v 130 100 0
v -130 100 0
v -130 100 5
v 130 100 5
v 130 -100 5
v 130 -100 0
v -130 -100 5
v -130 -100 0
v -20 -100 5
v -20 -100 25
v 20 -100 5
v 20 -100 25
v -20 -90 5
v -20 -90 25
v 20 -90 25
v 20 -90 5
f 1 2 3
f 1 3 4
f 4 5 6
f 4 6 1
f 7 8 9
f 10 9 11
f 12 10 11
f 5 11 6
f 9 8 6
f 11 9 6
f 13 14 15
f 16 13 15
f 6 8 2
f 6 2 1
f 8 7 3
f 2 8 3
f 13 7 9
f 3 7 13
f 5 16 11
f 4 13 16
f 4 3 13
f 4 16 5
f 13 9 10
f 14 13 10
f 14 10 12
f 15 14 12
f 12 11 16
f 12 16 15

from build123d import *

# Parameters (mm, degrees)
SKETCH1_W           = 300
SKETCH1_H           = 200
BOSS_EXTRUDE1_DEPTH = 5
SKETCH3_W           = 20
SKETCH3_H           = 20
SKETCH3_H_2         = 40
CUT_EXTRUDE1_DEPTH  = 5
SKETCH4_W           = 20
SKETCH4_H           = 140
CUT_EXTRUDE2_DEPTH  = 10
SKETCH6_W           = 40
SKETCH6_H           = 25
BOSS_EXTRUDE3_DEPTH = 10


with BuildPart() as part:
    # Sketch1 → Boss-Extrude1 (new body)
    with BuildSketch(Plane.XY):
        Rectangle(SKETCH1_W, SKETCH1_H)
    extrude(amount=BOSS_EXTRUDE1_DEPTH)

    # Sketch3 → Cut-Extrude1 (cut)
    with BuildSketch(Plane.XY.offset(5)):
        with Locations((-140, -90)):
            Rectangle(SKETCH3_W, SKETCH3_H)
        with Locations((-140, 80)):
            Rectangle(SKETCH3_W, SKETCH3_H_2)
        with Locations((140, 80)):
            Rectangle(SKETCH3_W, SKETCH3_H_2)
        with Locations((140, -90)):
            Rectangle(SKETCH3_W, SKETCH3_H)
    extrude(amount=-CUT_EXTRUDE1_DEPTH, mode=Mode.SUBTRACT)

    # Sketch4 → Cut-Extrude2 (cut)
    with BuildSketch(Plane.XY.offset(5)):
        with Locations((-140, -10)):
            Rectangle(SKETCH4_W, SKETCH4_H)
        with Locations((140, -10)):
            Rectangle(SKETCH4_W, SKETCH4_H)
    extrude(amount=-CUT_EXTRUDE2_DEPTH, mode=Mode.SUBTRACT)

    # Sketch6 → Boss-Extrude3 (add)
    with BuildSketch(Plane.XZ.offset(100)):
        with Locations((0, 12.5)):
            Rectangle(SKETCH6_W, SKETCH6_H)
    extrude(amount=-BOSS_EXTRUDE3_DEPTH)


solid = part.part
